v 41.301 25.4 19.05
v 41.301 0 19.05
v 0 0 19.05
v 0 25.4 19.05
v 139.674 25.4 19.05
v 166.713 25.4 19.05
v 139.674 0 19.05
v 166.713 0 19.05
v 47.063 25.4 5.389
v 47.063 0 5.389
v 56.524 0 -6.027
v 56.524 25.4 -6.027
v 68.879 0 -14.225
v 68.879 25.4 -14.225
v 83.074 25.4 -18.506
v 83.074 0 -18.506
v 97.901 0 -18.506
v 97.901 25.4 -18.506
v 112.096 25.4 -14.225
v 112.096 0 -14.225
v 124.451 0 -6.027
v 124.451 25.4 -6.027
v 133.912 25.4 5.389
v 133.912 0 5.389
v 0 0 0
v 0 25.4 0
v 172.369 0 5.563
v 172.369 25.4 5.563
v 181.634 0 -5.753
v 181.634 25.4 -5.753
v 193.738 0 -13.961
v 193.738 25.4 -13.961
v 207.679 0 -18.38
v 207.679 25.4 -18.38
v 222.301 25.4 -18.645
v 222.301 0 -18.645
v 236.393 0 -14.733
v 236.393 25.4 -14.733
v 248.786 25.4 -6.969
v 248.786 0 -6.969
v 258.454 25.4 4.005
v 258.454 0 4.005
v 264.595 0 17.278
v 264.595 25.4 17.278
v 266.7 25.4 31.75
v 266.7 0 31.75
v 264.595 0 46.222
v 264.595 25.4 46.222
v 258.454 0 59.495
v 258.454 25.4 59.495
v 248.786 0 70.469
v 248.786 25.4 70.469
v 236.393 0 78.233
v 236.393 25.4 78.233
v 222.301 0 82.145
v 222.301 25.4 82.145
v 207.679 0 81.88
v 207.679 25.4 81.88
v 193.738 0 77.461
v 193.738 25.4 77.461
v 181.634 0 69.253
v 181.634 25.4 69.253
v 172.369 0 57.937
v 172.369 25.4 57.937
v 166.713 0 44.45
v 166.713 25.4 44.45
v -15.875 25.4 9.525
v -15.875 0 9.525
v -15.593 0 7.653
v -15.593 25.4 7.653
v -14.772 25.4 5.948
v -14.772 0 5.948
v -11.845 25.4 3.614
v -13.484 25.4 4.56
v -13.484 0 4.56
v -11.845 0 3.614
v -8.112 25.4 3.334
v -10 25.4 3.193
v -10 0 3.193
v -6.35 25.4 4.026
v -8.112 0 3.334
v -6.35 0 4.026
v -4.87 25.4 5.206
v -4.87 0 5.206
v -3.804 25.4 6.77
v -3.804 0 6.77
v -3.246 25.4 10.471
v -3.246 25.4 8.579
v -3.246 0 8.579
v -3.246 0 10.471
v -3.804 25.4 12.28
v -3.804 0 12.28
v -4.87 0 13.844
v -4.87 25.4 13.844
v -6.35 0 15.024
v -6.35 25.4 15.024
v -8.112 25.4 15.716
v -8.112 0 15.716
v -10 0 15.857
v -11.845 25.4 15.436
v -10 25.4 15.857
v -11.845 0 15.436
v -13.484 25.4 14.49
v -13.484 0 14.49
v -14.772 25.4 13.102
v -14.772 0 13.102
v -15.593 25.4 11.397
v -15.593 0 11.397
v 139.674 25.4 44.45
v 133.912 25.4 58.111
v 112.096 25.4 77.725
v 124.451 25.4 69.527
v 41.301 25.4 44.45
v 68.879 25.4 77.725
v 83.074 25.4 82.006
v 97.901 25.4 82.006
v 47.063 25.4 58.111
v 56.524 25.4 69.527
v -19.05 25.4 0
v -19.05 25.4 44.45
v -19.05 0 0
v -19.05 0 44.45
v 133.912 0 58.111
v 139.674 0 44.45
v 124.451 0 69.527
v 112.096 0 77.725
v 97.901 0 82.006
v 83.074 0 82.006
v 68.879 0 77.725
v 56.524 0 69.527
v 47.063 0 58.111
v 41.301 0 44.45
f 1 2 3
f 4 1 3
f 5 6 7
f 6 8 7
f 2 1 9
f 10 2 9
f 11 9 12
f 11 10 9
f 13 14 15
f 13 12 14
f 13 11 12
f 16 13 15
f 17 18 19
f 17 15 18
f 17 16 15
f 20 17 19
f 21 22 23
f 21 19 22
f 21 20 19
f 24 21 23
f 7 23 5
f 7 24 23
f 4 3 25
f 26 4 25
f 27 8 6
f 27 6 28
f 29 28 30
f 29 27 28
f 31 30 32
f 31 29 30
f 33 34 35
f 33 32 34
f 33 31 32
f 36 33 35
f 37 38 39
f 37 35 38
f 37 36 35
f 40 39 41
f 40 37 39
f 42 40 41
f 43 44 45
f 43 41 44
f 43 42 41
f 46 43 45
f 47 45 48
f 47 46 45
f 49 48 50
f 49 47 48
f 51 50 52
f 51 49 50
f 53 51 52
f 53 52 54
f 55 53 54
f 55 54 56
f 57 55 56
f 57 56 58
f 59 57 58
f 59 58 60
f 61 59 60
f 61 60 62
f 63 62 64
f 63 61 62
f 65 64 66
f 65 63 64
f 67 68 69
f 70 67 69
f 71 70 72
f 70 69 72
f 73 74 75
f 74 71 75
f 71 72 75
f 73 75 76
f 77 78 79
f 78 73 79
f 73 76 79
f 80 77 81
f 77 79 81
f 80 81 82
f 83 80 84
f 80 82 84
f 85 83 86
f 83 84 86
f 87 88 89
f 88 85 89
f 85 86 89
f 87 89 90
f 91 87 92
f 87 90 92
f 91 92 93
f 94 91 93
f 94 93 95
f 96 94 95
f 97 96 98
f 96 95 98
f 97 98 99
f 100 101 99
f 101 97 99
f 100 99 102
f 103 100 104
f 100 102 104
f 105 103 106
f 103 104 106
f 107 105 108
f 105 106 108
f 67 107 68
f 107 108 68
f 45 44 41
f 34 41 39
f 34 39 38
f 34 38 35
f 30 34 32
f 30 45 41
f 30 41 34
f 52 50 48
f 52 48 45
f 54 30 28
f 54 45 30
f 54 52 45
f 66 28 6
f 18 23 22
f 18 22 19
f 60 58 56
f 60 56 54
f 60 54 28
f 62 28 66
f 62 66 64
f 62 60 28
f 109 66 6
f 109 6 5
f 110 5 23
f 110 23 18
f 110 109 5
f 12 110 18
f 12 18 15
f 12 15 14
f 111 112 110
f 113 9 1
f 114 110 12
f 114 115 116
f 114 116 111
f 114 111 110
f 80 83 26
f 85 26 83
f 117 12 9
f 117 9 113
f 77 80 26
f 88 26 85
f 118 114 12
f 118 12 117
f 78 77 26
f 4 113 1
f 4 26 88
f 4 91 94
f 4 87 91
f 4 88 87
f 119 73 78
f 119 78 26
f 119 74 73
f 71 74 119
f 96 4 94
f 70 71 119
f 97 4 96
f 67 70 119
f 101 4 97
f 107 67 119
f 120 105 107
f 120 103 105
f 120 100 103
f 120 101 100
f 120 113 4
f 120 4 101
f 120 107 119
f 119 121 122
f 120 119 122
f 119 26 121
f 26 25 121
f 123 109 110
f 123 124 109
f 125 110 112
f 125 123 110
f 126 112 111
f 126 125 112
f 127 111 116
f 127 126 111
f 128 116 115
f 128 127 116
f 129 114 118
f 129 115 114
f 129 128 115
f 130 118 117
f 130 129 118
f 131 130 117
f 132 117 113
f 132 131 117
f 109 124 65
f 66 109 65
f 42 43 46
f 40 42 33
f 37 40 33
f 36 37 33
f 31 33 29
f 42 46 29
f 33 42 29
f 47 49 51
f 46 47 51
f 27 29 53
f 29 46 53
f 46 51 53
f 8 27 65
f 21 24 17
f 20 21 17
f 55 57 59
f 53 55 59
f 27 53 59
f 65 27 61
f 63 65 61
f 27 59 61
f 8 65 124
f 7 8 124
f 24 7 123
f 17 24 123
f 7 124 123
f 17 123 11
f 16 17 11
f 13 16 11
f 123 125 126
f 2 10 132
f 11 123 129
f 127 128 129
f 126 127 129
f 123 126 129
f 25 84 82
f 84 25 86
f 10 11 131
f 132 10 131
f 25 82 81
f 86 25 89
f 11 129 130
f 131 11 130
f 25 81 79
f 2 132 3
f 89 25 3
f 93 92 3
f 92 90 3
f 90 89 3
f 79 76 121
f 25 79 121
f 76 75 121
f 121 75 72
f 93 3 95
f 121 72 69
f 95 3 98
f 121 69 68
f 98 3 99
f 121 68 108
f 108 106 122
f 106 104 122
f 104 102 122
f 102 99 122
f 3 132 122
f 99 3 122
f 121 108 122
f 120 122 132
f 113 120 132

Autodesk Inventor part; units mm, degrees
ref_plane "YZ Plane" through (0, 0, 0) normal (1, 0, 0) x (0, 1, 0)
ref_plane "XZ Plane" through (0, 0, 0) normal (0, 1, 0) x (-1, 0, 0)
ref_plane "XY Plane" through (0, 0, 0) normal (0, 0, 1) x (1, 0, 0)
sketch "Sketch1" plane through (0, 0, 0) normal (0, 1, 0) x (-1, 0, 0)
  line L0 (0, 0) -> (19.05, 0)
  line L1 (19.05, 0) -> (19.05, 44.45)
  line L2 (0, 19.05) -> (0, 0)
  circle A0 centre (9.525, 9.525) radius 6.35
  arc A1 (-166.7131, 44.45) -> (-166.7131, 19.05) centre (-215.9, 31.75) ccw
  line L3 (19.05, 44.45) -> (-41.3006, 44.45)
  line L4 (-139.6744, 44.45) -> (-166.7131, 44.45)
  line L5 (-166.7131, 19.05) -> (-139.6744, 19.05)
  line L6 (-41.3006, 19.05) -> (0, 19.05)
  arc A2 (-41.3006, 44.45) -> (-139.6744, 44.45) centre (-90.4875, 31.75) ccw
  arc A3 (-139.6744, 19.05) -> (-41.3006, 19.05) centre (-90.4875, 31.75) ccw
  dimension "d0" = 19.05
  dimension "d2" = 12.7
  dimension "d5" = 44.45
extrude "Extrusion1" add sketch "Sketch1" along normal blind 25.4
properties part number "wheels"
